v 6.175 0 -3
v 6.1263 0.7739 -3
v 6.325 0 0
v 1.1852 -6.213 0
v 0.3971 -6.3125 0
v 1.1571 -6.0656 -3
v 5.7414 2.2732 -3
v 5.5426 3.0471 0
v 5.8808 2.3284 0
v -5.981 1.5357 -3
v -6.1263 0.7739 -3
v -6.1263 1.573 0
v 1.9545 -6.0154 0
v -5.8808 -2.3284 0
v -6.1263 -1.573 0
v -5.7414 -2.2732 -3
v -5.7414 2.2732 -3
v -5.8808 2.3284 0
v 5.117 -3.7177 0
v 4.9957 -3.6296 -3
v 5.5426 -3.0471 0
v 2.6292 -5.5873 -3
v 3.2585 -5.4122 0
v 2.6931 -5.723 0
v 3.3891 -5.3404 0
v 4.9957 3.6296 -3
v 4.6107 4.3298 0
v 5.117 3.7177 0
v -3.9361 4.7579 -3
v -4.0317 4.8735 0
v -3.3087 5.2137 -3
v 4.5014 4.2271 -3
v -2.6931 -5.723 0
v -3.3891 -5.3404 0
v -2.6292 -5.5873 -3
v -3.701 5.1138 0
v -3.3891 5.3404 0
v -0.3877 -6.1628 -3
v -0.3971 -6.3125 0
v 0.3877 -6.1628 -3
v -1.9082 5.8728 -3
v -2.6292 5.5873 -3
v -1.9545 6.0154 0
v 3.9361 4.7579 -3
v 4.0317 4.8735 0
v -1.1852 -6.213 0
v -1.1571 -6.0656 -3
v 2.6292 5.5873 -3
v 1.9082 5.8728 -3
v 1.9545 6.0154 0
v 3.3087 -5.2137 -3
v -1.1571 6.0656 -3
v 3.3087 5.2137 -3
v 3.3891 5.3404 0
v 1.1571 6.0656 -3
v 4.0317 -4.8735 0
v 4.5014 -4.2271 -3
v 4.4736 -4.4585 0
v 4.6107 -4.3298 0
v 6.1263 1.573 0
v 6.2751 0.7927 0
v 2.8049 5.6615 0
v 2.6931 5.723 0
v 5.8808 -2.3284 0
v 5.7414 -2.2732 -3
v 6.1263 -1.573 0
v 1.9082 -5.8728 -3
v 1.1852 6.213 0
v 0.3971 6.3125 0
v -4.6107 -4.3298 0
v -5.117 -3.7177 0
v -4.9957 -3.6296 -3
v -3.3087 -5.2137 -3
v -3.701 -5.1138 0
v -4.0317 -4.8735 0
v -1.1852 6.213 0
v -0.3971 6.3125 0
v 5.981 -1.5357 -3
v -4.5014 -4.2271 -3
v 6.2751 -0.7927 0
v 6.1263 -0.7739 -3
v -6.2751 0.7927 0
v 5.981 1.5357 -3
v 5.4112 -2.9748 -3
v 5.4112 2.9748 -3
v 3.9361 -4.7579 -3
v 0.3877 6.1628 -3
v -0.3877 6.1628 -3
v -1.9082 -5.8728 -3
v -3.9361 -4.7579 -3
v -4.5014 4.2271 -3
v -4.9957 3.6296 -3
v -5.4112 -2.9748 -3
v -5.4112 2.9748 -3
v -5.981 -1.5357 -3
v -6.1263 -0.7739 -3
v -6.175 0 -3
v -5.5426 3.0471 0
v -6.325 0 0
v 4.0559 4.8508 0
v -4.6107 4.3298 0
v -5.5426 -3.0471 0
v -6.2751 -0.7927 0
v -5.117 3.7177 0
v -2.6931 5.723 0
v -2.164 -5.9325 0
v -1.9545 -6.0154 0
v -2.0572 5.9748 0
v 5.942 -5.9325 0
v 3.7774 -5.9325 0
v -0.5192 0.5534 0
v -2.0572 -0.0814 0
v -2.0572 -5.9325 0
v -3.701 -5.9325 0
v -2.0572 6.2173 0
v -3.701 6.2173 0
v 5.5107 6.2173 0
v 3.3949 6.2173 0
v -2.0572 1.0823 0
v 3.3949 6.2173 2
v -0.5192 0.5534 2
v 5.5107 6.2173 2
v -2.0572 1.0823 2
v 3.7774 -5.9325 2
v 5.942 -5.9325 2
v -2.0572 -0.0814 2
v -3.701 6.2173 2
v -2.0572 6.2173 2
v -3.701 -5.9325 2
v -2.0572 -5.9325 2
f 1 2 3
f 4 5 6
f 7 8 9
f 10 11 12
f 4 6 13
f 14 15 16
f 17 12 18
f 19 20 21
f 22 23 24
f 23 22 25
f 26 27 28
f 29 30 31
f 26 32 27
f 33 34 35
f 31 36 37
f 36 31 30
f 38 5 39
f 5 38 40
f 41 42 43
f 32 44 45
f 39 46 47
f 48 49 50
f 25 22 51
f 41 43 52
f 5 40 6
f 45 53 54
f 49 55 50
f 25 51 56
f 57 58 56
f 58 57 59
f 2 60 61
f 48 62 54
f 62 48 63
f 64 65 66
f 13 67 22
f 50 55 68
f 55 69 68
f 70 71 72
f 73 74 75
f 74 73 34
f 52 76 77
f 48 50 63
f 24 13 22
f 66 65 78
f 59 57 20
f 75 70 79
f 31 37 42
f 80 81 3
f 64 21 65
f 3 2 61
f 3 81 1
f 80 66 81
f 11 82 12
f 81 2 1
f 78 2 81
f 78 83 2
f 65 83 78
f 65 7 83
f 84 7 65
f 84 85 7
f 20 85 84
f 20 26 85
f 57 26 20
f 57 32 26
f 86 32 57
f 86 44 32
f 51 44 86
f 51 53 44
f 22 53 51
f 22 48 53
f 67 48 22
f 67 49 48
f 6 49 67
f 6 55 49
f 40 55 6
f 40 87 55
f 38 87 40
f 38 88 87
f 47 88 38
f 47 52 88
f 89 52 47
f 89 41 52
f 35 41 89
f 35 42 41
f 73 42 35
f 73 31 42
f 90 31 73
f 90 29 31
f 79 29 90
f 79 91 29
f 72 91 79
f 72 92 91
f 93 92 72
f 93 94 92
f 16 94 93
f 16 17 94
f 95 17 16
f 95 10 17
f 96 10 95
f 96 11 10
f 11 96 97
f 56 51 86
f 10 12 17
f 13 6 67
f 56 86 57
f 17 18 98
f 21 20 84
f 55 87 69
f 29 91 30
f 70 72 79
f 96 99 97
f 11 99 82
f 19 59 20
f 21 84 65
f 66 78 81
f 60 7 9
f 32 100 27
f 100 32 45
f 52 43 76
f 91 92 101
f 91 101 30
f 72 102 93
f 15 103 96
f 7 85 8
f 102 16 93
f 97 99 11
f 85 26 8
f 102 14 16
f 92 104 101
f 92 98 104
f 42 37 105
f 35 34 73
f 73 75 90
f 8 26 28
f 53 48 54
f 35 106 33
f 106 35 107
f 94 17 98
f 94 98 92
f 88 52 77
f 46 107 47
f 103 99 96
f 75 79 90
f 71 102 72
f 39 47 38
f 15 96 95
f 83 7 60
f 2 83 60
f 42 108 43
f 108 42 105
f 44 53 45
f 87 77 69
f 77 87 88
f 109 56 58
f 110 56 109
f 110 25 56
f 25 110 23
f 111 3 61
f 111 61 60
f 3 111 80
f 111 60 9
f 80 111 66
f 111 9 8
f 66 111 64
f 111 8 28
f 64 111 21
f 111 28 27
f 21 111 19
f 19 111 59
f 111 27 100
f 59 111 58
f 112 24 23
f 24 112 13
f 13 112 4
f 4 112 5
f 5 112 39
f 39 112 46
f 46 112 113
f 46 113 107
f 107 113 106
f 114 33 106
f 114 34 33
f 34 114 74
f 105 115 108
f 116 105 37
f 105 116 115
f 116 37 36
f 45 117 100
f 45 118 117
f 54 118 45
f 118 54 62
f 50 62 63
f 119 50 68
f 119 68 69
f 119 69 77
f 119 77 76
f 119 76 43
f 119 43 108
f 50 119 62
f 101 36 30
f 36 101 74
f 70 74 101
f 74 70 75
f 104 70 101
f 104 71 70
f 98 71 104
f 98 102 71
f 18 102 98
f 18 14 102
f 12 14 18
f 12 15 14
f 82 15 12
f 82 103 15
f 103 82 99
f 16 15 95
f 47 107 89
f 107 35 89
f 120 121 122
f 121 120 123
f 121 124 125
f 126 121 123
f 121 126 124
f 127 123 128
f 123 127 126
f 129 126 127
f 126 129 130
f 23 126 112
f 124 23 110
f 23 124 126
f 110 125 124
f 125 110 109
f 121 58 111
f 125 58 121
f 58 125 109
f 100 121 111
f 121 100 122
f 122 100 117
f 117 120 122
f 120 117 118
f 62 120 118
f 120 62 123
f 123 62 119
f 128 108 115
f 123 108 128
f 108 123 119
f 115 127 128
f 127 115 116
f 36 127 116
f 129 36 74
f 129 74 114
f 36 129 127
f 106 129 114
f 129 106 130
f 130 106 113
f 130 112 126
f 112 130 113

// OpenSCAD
$fn = 50;

difference() {
	union() {
		translate(v = [0, 0, -3.0]) {
			cylinder(h = 3, r1 = 6.175, r2 = 6.325);
		}
		linear_extrude(height = 2) {
			text(font = "Impact", halign = "center", size = 12, text = "K", valign = "center");
		}
	}
	union();
}
